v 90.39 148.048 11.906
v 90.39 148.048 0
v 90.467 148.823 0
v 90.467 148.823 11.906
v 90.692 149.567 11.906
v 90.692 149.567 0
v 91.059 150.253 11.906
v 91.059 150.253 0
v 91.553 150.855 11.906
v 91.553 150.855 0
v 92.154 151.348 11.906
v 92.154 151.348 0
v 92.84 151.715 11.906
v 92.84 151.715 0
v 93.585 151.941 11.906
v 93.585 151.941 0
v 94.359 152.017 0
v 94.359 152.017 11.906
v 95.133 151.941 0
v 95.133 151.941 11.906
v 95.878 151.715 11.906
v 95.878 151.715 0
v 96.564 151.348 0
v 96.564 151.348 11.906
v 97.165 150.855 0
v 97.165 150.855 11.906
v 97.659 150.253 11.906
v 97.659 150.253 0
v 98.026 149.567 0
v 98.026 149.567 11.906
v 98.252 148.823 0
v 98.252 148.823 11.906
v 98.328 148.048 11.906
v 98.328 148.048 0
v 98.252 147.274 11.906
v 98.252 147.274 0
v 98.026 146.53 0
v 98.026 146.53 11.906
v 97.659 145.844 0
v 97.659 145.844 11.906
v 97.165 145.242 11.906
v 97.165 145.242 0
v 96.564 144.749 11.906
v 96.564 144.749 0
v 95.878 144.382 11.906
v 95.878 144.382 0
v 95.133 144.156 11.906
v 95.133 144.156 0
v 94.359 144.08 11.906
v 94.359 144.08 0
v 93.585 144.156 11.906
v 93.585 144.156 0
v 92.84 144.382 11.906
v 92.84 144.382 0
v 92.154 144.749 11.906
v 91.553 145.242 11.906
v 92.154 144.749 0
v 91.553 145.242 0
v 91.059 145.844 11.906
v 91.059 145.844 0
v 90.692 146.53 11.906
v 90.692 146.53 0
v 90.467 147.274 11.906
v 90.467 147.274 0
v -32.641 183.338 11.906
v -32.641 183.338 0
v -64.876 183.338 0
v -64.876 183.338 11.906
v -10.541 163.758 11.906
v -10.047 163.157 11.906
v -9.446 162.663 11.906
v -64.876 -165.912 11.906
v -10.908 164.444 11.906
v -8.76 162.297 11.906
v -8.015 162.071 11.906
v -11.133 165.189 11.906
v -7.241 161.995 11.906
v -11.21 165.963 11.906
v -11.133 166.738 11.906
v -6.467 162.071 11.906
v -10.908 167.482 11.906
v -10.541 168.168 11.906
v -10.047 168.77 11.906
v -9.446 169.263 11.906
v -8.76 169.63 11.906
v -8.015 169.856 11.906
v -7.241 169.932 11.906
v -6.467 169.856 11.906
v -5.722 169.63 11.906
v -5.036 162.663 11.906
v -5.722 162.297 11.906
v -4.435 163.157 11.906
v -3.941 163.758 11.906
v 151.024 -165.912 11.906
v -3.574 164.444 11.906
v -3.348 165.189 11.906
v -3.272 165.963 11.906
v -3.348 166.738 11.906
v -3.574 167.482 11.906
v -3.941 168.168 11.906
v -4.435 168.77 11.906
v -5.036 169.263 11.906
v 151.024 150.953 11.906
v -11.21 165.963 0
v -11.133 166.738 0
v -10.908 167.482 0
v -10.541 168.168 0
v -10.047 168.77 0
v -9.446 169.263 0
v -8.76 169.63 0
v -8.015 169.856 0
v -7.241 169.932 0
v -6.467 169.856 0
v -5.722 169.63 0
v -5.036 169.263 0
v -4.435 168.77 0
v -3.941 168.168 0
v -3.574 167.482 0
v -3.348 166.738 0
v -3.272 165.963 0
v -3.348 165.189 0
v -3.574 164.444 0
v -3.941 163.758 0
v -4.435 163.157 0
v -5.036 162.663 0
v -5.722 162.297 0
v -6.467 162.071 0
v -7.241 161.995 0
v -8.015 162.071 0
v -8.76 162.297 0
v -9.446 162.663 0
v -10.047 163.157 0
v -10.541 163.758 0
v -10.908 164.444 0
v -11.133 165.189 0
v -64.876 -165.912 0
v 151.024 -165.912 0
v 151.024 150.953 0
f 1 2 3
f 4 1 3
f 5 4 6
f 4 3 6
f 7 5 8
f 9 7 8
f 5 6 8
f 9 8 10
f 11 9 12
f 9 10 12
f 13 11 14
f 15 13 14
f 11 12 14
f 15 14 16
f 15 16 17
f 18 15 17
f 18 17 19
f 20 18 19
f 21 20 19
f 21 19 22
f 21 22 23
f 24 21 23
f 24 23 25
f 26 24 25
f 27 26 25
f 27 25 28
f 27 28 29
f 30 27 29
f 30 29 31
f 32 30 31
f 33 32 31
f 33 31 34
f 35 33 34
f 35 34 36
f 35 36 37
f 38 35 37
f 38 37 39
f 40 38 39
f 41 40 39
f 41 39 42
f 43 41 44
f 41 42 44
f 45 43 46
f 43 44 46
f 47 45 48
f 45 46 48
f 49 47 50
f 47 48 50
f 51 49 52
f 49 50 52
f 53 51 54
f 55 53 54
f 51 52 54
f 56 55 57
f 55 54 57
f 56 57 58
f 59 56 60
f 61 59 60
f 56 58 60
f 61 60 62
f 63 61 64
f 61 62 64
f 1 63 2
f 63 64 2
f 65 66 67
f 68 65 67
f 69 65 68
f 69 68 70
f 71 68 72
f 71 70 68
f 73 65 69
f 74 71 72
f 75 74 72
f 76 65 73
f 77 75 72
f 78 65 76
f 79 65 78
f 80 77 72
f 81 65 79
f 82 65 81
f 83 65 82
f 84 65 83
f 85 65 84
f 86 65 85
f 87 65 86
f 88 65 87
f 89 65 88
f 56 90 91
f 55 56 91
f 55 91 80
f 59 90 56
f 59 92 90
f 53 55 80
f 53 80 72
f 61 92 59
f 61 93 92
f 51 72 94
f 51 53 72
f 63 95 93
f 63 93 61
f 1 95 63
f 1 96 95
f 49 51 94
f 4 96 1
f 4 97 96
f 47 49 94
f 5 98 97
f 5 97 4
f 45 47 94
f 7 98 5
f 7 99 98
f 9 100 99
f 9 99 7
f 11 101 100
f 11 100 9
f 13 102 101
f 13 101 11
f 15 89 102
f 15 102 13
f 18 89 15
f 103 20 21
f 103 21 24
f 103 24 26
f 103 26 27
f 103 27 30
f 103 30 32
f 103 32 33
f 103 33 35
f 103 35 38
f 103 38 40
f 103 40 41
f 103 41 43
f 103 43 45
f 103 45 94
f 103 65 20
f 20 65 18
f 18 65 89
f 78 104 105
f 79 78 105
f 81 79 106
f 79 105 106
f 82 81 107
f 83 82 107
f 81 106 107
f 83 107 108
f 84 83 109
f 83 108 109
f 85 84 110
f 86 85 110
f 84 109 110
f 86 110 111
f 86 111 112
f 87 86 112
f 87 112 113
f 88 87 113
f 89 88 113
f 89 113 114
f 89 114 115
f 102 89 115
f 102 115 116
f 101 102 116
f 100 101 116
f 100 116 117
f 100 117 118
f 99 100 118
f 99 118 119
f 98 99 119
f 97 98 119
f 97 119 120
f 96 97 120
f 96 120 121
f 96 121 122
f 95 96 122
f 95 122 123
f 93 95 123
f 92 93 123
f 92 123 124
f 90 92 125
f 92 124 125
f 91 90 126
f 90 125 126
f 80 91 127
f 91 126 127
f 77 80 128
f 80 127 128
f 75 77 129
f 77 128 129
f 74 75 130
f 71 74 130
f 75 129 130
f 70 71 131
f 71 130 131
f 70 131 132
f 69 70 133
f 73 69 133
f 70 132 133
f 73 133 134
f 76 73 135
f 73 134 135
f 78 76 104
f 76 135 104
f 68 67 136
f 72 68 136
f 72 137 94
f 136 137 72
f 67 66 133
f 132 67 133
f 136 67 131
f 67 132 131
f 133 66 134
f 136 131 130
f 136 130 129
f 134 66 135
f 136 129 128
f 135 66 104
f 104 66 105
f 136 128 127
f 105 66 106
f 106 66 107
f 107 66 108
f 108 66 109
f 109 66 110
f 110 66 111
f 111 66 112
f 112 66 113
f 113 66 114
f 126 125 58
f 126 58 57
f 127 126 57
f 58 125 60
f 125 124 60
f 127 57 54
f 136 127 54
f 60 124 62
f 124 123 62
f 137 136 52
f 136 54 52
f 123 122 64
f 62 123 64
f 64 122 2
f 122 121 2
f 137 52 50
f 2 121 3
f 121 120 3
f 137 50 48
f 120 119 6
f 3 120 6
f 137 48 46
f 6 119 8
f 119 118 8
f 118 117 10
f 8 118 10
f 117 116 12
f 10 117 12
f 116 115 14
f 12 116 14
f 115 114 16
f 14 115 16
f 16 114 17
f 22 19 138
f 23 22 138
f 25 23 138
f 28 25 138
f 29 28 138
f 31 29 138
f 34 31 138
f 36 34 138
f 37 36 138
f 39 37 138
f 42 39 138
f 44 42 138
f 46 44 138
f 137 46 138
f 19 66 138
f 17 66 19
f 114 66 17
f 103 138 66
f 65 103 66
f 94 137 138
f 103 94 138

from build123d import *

# Parameters (mm, degrees)
BOSS_EXTRUDE1_DEPTH            = 11.90625
F_5_16_0_3125_DIAMETER_HOLE1_D = 7.9375
SKETCH4_W                      = 220.489922176
SKETCH4_H                      = 247.65
CUT_EXTRUDE1_DEPTH             = 12.90625


with BuildPart() as part:
    # Sketch1 → Boss-Extrude1 (new body)
    with BuildSketch(Plane.XY):
        Polygon((151.023557582, 150.952887465), (-32.640904146, 183.337887465), (-64.876442418, 183.337887465), (-64.876442418, -413.562112535), (-32.640904146, -413.562112535), (151.023557582, -381.177112535), align=None)
    extrude(amount=BOSS_EXTRUDE1_DEPTH)

    # 5/16 (0.3125) Diameter Hole1 (through all)
    with Locations(Plane.XY.offset(11.90625)):
        with Locations((94.359095854, 148.048442944), (-7.240904146, 165.963264184), (-7.240904146, -396.187489254), (94.359095854, -378.272668014)):
            Hole(F_5_16_0_3125_DIAMETER_HOLE1_D / 2)

    # Sketch4 → Cut-Extrude1 (cut, through all)
    with BuildSketch(Plane(origin=(0, 0, 0), x_dir=(-1, 0, 0), z_dir=(0, 0, -1))):
        with Locations((-45.36851867, -289.737112535)):
            Rectangle(SKETCH4_W, SKETCH4_H)
    extrude(amount=-CUT_EXTRUDE1_DEPTH, mode=Mode.SUBTRACT)


solid = part.part
